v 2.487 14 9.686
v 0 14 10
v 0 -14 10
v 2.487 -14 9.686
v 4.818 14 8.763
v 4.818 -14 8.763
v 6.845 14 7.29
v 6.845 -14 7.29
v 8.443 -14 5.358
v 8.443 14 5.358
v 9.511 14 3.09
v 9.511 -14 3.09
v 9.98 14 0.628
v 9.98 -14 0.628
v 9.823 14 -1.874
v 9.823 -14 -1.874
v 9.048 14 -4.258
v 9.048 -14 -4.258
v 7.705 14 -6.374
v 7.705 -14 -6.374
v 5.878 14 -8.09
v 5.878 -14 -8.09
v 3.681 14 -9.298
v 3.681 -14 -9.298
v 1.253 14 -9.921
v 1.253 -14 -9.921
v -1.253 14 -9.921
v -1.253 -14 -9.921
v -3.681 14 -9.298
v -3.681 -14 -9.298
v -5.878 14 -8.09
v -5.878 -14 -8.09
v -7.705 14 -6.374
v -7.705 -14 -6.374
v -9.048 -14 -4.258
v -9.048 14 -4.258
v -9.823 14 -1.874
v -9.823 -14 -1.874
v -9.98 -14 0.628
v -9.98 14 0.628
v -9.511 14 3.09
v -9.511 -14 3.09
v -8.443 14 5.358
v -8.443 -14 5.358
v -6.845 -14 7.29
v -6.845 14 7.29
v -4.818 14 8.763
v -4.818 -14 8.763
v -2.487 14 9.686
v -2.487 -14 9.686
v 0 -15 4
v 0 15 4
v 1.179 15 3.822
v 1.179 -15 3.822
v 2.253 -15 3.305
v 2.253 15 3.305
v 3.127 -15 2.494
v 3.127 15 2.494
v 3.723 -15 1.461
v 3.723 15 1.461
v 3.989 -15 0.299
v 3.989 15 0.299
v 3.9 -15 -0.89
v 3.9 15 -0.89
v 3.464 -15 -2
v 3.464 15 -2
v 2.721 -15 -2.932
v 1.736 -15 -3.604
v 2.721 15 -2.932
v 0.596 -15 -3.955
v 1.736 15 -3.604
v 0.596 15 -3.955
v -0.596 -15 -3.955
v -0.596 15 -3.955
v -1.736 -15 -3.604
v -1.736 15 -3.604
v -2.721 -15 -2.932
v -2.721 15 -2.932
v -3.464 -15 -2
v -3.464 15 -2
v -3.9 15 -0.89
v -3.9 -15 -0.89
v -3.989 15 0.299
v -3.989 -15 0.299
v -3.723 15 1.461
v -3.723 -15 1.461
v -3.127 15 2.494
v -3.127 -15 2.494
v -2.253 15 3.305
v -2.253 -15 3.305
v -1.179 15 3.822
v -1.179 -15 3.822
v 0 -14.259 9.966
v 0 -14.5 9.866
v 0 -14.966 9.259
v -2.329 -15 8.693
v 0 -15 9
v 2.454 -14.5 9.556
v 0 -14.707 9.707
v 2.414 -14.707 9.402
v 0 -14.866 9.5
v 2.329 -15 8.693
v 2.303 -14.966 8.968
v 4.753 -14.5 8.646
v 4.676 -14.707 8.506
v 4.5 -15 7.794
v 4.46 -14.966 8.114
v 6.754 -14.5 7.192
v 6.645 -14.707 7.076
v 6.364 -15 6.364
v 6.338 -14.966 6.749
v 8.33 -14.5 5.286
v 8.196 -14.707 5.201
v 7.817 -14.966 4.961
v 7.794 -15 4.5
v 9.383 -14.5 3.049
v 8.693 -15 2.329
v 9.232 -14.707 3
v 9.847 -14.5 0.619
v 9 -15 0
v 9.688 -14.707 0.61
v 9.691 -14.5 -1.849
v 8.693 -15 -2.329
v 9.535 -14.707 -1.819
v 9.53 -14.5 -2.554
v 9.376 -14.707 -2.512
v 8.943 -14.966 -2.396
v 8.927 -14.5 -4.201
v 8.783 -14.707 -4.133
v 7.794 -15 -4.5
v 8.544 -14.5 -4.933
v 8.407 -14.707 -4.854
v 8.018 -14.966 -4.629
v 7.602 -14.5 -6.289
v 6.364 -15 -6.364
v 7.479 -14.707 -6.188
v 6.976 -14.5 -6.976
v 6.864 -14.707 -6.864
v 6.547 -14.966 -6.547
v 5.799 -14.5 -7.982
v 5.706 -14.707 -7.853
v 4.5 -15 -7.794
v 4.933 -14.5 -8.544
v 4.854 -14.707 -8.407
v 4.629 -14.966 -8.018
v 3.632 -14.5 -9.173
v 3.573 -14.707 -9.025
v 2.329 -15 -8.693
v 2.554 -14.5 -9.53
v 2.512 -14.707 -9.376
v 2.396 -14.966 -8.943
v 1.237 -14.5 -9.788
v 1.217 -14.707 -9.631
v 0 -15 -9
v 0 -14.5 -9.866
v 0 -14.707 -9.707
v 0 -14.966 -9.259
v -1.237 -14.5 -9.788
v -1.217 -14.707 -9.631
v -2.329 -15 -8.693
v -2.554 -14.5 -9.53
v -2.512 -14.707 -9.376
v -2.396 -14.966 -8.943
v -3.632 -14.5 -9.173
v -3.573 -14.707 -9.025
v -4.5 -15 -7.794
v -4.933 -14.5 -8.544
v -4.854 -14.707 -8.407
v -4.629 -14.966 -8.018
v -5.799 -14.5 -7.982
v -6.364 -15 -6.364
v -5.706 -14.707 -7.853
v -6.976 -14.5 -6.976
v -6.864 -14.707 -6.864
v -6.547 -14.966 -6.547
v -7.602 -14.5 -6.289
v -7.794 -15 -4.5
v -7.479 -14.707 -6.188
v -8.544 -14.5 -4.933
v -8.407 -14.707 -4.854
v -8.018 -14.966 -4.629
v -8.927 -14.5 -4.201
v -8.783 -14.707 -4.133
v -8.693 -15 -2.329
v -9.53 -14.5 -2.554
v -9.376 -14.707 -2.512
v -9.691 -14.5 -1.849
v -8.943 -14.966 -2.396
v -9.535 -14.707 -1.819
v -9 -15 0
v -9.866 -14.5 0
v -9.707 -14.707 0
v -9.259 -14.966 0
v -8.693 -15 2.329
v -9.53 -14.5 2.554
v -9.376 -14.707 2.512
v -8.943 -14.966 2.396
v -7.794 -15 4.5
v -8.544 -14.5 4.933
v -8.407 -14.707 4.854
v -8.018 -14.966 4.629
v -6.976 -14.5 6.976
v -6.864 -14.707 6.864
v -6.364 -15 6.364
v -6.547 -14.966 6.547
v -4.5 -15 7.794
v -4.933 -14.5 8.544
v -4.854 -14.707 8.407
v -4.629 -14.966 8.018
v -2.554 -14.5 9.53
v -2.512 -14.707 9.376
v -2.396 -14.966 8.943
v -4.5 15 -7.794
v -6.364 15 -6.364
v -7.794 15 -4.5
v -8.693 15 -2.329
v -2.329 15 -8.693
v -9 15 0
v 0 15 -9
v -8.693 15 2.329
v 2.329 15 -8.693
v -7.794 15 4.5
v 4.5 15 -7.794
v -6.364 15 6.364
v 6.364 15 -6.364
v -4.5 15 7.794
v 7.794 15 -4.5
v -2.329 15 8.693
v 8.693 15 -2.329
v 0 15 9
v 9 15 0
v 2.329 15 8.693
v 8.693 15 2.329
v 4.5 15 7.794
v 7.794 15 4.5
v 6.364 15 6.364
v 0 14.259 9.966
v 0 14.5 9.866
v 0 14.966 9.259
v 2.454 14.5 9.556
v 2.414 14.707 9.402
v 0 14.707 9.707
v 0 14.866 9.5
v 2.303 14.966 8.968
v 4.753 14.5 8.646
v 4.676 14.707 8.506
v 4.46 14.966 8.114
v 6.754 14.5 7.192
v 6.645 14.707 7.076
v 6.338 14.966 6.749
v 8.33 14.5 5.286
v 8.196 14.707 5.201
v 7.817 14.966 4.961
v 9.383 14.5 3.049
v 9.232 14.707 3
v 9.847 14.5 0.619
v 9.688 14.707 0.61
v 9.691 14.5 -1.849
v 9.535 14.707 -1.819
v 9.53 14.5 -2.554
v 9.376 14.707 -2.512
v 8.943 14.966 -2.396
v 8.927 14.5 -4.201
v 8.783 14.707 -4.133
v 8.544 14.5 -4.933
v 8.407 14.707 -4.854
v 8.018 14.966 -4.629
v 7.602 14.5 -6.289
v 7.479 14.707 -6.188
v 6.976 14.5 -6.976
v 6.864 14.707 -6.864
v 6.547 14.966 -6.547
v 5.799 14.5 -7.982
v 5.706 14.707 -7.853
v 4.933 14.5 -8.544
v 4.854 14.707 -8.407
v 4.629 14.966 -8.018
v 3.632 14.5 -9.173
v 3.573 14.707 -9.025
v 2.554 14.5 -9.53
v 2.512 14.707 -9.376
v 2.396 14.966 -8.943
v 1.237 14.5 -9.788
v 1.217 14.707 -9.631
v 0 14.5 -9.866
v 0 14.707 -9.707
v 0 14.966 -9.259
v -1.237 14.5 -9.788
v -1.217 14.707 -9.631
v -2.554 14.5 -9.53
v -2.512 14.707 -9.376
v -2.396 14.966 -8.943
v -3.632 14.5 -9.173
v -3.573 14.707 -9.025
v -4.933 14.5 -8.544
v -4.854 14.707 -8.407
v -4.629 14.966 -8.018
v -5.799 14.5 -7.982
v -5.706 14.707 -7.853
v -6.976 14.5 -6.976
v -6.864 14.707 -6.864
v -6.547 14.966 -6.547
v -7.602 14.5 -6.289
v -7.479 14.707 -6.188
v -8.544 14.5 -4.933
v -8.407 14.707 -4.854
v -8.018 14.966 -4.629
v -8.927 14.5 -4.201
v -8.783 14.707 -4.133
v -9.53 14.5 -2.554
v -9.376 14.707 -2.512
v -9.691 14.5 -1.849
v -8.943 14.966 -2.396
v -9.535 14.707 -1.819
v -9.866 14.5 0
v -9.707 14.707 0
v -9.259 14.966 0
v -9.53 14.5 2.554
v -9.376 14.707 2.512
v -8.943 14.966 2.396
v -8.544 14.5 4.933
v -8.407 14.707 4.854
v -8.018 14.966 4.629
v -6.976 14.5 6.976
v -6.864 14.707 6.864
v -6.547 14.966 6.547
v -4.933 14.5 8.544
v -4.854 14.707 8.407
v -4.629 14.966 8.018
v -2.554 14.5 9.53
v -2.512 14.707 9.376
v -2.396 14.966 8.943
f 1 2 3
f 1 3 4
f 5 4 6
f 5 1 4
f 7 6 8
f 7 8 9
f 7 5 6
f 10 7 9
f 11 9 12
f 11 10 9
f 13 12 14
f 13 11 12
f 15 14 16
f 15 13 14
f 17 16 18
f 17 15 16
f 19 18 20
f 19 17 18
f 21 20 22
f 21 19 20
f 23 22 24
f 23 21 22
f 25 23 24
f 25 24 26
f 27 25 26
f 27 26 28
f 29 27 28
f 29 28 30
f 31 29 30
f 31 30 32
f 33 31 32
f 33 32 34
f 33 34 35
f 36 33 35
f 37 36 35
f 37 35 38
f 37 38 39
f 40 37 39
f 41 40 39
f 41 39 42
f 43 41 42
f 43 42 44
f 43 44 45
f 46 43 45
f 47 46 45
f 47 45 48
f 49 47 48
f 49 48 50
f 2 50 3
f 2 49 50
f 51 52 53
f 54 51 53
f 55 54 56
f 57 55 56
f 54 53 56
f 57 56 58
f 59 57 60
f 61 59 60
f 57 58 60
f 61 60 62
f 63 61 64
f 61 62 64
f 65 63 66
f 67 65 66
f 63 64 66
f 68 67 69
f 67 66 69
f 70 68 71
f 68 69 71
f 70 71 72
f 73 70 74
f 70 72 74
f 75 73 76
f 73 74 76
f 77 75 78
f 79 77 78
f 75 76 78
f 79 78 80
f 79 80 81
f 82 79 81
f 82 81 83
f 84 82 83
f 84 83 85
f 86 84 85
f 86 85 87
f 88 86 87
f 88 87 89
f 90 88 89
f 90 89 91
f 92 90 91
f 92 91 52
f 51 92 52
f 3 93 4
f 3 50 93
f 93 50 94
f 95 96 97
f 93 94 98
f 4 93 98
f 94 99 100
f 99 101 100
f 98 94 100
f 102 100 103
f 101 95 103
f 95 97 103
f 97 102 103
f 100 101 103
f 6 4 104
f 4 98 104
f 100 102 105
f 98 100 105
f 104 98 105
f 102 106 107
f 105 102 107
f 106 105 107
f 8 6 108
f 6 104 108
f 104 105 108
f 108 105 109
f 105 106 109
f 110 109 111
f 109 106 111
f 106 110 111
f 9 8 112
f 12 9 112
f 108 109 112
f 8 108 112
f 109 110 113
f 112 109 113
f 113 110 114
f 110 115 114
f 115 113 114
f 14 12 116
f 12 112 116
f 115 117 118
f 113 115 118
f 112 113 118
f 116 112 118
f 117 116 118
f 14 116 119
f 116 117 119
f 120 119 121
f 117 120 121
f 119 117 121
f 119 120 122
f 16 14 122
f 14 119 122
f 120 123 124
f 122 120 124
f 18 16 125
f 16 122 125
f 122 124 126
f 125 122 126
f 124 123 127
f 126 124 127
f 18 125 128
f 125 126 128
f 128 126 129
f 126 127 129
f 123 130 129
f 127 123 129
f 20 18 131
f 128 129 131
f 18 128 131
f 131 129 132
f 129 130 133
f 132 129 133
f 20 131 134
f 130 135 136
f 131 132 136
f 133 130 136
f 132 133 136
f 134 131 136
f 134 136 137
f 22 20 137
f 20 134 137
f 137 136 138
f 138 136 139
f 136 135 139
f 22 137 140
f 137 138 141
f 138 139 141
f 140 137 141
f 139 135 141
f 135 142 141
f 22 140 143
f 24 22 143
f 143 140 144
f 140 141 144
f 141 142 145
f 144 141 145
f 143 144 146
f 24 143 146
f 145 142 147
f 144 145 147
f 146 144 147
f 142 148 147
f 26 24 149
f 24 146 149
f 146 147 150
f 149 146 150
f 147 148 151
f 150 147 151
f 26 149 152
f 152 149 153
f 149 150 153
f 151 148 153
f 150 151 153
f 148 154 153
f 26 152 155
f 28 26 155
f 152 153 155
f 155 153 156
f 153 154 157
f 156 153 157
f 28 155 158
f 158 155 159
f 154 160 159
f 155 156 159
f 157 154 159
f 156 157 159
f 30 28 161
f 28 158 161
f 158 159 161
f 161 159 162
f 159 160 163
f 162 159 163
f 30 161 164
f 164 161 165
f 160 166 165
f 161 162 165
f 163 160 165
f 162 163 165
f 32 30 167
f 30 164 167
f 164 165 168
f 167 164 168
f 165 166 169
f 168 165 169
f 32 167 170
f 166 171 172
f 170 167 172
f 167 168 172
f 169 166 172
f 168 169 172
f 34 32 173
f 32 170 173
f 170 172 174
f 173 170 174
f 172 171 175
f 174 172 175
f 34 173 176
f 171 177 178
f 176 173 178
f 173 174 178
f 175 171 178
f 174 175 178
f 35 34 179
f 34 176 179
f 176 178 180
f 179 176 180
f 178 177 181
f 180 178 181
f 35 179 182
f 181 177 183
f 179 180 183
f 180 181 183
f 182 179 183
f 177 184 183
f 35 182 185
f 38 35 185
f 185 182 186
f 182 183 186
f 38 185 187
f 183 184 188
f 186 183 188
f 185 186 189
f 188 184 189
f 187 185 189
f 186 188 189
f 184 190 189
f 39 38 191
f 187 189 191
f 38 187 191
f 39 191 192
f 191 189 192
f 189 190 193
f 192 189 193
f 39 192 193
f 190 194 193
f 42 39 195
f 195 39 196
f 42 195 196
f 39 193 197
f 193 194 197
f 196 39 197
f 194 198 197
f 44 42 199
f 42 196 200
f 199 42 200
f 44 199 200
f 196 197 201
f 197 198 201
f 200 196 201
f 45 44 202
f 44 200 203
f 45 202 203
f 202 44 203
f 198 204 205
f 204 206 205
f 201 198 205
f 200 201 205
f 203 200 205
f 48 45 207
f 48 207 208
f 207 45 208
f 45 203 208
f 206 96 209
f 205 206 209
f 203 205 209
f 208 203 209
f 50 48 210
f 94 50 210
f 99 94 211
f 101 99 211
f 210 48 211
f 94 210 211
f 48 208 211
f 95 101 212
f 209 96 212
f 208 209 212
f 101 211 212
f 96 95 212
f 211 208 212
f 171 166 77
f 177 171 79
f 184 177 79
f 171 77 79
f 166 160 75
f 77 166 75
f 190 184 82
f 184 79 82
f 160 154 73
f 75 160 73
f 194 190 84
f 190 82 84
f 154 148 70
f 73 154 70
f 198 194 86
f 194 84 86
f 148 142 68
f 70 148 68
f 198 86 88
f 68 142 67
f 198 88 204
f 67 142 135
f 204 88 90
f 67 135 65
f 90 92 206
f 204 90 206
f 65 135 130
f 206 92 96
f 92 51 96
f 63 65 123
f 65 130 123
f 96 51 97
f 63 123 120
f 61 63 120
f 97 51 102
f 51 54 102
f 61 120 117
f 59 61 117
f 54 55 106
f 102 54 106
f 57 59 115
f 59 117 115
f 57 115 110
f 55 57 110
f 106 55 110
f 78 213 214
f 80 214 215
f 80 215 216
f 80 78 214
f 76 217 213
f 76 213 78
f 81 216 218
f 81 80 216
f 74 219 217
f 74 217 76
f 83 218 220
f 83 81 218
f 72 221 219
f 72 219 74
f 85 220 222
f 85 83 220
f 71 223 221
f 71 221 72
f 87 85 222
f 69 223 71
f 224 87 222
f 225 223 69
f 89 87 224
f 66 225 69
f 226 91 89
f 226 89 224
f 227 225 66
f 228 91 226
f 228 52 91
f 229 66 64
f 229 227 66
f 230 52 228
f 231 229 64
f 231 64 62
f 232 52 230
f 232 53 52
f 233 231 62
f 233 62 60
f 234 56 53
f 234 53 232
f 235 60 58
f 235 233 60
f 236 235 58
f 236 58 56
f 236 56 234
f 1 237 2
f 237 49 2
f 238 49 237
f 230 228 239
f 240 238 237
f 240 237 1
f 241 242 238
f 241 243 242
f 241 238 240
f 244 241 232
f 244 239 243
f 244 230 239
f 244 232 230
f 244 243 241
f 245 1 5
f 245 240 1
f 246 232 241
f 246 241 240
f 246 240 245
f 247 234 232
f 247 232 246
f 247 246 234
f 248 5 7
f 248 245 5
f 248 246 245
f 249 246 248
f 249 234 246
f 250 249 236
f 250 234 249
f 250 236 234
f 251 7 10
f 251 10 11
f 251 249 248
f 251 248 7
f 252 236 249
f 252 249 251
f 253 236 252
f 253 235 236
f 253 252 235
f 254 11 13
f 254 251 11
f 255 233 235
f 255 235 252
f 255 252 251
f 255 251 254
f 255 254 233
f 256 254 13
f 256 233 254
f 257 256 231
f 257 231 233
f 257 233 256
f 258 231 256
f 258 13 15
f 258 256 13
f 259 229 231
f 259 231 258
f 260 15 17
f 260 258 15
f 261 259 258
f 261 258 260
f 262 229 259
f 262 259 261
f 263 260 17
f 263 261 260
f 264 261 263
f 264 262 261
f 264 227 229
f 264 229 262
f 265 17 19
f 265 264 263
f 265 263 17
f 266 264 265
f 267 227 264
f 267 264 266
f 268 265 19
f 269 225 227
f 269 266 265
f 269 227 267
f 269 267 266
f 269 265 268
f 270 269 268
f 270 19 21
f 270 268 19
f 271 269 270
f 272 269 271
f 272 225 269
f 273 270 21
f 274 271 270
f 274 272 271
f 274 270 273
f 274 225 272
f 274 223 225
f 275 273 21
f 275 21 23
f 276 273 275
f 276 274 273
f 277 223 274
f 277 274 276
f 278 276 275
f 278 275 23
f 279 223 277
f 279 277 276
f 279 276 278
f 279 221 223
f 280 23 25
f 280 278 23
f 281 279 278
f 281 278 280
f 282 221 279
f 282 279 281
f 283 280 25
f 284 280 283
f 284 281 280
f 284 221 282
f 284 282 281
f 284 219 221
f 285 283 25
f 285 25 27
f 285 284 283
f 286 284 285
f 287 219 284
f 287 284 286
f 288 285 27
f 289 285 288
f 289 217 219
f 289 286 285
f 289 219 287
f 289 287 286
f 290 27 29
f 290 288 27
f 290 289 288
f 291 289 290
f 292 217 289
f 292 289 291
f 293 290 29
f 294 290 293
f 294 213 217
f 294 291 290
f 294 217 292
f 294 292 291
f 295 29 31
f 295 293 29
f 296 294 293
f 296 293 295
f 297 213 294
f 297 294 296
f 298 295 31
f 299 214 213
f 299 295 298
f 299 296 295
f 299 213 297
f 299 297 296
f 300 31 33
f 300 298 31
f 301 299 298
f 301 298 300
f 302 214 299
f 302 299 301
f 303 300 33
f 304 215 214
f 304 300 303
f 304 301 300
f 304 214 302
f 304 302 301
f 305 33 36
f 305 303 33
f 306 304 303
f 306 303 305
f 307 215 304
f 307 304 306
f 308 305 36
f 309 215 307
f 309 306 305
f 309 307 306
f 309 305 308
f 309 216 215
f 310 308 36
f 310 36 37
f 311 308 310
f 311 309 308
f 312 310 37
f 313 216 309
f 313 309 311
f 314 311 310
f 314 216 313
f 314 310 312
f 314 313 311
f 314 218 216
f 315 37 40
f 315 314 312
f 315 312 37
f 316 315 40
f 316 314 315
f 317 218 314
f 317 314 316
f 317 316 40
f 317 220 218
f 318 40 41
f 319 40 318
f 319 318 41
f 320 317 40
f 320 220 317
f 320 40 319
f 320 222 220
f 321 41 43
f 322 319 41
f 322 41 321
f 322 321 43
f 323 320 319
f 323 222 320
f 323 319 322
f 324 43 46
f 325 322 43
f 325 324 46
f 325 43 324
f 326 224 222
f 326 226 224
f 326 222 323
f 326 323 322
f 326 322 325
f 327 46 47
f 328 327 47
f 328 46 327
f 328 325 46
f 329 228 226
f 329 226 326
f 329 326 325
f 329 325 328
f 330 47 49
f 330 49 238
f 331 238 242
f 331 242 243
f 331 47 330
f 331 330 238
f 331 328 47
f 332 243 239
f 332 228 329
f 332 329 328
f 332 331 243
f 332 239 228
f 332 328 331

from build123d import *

# Parameters (mm, degrees)
SKETCH1_R           = 10
BOSS_EXTRUDE1_DEPTH = 15
SKETCH2_R           = 4
CUT_EXTRUDE1_DEPTH  = 34.166247904
FILLET1_R           = 1


with BuildPart() as part:
    # Sketch1 → Boss-Extrude1 (new, symmetric)
    with BuildSketch(Plane(origin=(0, 0, 0), x_dir=(1, 0, 0), z_dir=(0, 1, 0))):
        with Locations(Location((0, 0, 0), (0, 0, 270))):
            Circle(SKETCH1_R)
    extrude(amount=BOSS_EXTRUDE1_DEPTH, both=True)

    # Sketch2 → Cut-Extrude1 (cut, through all)
    with BuildSketch(Plane(origin=(0, 15, 0), x_dir=(1, 0, 0), z_dir=(0, 1, 0))):
        with Locations(Location((0, 0, 0), (0, 0, 270))):
            Circle(SKETCH2_R)
    extrude(amount=-CUT_EXTRUDE1_DEPTH, mode=Mode.SUBTRACT)

    # Fillet1
    fillet1_edges = [part.edges().sort_by_distance(p)[0] for p in [
        (0, -15, -10),
        (0, 15, -10),
    ]]
    fillet(fillet1_edges, radius=FILLET1_R)


solid = part.part
